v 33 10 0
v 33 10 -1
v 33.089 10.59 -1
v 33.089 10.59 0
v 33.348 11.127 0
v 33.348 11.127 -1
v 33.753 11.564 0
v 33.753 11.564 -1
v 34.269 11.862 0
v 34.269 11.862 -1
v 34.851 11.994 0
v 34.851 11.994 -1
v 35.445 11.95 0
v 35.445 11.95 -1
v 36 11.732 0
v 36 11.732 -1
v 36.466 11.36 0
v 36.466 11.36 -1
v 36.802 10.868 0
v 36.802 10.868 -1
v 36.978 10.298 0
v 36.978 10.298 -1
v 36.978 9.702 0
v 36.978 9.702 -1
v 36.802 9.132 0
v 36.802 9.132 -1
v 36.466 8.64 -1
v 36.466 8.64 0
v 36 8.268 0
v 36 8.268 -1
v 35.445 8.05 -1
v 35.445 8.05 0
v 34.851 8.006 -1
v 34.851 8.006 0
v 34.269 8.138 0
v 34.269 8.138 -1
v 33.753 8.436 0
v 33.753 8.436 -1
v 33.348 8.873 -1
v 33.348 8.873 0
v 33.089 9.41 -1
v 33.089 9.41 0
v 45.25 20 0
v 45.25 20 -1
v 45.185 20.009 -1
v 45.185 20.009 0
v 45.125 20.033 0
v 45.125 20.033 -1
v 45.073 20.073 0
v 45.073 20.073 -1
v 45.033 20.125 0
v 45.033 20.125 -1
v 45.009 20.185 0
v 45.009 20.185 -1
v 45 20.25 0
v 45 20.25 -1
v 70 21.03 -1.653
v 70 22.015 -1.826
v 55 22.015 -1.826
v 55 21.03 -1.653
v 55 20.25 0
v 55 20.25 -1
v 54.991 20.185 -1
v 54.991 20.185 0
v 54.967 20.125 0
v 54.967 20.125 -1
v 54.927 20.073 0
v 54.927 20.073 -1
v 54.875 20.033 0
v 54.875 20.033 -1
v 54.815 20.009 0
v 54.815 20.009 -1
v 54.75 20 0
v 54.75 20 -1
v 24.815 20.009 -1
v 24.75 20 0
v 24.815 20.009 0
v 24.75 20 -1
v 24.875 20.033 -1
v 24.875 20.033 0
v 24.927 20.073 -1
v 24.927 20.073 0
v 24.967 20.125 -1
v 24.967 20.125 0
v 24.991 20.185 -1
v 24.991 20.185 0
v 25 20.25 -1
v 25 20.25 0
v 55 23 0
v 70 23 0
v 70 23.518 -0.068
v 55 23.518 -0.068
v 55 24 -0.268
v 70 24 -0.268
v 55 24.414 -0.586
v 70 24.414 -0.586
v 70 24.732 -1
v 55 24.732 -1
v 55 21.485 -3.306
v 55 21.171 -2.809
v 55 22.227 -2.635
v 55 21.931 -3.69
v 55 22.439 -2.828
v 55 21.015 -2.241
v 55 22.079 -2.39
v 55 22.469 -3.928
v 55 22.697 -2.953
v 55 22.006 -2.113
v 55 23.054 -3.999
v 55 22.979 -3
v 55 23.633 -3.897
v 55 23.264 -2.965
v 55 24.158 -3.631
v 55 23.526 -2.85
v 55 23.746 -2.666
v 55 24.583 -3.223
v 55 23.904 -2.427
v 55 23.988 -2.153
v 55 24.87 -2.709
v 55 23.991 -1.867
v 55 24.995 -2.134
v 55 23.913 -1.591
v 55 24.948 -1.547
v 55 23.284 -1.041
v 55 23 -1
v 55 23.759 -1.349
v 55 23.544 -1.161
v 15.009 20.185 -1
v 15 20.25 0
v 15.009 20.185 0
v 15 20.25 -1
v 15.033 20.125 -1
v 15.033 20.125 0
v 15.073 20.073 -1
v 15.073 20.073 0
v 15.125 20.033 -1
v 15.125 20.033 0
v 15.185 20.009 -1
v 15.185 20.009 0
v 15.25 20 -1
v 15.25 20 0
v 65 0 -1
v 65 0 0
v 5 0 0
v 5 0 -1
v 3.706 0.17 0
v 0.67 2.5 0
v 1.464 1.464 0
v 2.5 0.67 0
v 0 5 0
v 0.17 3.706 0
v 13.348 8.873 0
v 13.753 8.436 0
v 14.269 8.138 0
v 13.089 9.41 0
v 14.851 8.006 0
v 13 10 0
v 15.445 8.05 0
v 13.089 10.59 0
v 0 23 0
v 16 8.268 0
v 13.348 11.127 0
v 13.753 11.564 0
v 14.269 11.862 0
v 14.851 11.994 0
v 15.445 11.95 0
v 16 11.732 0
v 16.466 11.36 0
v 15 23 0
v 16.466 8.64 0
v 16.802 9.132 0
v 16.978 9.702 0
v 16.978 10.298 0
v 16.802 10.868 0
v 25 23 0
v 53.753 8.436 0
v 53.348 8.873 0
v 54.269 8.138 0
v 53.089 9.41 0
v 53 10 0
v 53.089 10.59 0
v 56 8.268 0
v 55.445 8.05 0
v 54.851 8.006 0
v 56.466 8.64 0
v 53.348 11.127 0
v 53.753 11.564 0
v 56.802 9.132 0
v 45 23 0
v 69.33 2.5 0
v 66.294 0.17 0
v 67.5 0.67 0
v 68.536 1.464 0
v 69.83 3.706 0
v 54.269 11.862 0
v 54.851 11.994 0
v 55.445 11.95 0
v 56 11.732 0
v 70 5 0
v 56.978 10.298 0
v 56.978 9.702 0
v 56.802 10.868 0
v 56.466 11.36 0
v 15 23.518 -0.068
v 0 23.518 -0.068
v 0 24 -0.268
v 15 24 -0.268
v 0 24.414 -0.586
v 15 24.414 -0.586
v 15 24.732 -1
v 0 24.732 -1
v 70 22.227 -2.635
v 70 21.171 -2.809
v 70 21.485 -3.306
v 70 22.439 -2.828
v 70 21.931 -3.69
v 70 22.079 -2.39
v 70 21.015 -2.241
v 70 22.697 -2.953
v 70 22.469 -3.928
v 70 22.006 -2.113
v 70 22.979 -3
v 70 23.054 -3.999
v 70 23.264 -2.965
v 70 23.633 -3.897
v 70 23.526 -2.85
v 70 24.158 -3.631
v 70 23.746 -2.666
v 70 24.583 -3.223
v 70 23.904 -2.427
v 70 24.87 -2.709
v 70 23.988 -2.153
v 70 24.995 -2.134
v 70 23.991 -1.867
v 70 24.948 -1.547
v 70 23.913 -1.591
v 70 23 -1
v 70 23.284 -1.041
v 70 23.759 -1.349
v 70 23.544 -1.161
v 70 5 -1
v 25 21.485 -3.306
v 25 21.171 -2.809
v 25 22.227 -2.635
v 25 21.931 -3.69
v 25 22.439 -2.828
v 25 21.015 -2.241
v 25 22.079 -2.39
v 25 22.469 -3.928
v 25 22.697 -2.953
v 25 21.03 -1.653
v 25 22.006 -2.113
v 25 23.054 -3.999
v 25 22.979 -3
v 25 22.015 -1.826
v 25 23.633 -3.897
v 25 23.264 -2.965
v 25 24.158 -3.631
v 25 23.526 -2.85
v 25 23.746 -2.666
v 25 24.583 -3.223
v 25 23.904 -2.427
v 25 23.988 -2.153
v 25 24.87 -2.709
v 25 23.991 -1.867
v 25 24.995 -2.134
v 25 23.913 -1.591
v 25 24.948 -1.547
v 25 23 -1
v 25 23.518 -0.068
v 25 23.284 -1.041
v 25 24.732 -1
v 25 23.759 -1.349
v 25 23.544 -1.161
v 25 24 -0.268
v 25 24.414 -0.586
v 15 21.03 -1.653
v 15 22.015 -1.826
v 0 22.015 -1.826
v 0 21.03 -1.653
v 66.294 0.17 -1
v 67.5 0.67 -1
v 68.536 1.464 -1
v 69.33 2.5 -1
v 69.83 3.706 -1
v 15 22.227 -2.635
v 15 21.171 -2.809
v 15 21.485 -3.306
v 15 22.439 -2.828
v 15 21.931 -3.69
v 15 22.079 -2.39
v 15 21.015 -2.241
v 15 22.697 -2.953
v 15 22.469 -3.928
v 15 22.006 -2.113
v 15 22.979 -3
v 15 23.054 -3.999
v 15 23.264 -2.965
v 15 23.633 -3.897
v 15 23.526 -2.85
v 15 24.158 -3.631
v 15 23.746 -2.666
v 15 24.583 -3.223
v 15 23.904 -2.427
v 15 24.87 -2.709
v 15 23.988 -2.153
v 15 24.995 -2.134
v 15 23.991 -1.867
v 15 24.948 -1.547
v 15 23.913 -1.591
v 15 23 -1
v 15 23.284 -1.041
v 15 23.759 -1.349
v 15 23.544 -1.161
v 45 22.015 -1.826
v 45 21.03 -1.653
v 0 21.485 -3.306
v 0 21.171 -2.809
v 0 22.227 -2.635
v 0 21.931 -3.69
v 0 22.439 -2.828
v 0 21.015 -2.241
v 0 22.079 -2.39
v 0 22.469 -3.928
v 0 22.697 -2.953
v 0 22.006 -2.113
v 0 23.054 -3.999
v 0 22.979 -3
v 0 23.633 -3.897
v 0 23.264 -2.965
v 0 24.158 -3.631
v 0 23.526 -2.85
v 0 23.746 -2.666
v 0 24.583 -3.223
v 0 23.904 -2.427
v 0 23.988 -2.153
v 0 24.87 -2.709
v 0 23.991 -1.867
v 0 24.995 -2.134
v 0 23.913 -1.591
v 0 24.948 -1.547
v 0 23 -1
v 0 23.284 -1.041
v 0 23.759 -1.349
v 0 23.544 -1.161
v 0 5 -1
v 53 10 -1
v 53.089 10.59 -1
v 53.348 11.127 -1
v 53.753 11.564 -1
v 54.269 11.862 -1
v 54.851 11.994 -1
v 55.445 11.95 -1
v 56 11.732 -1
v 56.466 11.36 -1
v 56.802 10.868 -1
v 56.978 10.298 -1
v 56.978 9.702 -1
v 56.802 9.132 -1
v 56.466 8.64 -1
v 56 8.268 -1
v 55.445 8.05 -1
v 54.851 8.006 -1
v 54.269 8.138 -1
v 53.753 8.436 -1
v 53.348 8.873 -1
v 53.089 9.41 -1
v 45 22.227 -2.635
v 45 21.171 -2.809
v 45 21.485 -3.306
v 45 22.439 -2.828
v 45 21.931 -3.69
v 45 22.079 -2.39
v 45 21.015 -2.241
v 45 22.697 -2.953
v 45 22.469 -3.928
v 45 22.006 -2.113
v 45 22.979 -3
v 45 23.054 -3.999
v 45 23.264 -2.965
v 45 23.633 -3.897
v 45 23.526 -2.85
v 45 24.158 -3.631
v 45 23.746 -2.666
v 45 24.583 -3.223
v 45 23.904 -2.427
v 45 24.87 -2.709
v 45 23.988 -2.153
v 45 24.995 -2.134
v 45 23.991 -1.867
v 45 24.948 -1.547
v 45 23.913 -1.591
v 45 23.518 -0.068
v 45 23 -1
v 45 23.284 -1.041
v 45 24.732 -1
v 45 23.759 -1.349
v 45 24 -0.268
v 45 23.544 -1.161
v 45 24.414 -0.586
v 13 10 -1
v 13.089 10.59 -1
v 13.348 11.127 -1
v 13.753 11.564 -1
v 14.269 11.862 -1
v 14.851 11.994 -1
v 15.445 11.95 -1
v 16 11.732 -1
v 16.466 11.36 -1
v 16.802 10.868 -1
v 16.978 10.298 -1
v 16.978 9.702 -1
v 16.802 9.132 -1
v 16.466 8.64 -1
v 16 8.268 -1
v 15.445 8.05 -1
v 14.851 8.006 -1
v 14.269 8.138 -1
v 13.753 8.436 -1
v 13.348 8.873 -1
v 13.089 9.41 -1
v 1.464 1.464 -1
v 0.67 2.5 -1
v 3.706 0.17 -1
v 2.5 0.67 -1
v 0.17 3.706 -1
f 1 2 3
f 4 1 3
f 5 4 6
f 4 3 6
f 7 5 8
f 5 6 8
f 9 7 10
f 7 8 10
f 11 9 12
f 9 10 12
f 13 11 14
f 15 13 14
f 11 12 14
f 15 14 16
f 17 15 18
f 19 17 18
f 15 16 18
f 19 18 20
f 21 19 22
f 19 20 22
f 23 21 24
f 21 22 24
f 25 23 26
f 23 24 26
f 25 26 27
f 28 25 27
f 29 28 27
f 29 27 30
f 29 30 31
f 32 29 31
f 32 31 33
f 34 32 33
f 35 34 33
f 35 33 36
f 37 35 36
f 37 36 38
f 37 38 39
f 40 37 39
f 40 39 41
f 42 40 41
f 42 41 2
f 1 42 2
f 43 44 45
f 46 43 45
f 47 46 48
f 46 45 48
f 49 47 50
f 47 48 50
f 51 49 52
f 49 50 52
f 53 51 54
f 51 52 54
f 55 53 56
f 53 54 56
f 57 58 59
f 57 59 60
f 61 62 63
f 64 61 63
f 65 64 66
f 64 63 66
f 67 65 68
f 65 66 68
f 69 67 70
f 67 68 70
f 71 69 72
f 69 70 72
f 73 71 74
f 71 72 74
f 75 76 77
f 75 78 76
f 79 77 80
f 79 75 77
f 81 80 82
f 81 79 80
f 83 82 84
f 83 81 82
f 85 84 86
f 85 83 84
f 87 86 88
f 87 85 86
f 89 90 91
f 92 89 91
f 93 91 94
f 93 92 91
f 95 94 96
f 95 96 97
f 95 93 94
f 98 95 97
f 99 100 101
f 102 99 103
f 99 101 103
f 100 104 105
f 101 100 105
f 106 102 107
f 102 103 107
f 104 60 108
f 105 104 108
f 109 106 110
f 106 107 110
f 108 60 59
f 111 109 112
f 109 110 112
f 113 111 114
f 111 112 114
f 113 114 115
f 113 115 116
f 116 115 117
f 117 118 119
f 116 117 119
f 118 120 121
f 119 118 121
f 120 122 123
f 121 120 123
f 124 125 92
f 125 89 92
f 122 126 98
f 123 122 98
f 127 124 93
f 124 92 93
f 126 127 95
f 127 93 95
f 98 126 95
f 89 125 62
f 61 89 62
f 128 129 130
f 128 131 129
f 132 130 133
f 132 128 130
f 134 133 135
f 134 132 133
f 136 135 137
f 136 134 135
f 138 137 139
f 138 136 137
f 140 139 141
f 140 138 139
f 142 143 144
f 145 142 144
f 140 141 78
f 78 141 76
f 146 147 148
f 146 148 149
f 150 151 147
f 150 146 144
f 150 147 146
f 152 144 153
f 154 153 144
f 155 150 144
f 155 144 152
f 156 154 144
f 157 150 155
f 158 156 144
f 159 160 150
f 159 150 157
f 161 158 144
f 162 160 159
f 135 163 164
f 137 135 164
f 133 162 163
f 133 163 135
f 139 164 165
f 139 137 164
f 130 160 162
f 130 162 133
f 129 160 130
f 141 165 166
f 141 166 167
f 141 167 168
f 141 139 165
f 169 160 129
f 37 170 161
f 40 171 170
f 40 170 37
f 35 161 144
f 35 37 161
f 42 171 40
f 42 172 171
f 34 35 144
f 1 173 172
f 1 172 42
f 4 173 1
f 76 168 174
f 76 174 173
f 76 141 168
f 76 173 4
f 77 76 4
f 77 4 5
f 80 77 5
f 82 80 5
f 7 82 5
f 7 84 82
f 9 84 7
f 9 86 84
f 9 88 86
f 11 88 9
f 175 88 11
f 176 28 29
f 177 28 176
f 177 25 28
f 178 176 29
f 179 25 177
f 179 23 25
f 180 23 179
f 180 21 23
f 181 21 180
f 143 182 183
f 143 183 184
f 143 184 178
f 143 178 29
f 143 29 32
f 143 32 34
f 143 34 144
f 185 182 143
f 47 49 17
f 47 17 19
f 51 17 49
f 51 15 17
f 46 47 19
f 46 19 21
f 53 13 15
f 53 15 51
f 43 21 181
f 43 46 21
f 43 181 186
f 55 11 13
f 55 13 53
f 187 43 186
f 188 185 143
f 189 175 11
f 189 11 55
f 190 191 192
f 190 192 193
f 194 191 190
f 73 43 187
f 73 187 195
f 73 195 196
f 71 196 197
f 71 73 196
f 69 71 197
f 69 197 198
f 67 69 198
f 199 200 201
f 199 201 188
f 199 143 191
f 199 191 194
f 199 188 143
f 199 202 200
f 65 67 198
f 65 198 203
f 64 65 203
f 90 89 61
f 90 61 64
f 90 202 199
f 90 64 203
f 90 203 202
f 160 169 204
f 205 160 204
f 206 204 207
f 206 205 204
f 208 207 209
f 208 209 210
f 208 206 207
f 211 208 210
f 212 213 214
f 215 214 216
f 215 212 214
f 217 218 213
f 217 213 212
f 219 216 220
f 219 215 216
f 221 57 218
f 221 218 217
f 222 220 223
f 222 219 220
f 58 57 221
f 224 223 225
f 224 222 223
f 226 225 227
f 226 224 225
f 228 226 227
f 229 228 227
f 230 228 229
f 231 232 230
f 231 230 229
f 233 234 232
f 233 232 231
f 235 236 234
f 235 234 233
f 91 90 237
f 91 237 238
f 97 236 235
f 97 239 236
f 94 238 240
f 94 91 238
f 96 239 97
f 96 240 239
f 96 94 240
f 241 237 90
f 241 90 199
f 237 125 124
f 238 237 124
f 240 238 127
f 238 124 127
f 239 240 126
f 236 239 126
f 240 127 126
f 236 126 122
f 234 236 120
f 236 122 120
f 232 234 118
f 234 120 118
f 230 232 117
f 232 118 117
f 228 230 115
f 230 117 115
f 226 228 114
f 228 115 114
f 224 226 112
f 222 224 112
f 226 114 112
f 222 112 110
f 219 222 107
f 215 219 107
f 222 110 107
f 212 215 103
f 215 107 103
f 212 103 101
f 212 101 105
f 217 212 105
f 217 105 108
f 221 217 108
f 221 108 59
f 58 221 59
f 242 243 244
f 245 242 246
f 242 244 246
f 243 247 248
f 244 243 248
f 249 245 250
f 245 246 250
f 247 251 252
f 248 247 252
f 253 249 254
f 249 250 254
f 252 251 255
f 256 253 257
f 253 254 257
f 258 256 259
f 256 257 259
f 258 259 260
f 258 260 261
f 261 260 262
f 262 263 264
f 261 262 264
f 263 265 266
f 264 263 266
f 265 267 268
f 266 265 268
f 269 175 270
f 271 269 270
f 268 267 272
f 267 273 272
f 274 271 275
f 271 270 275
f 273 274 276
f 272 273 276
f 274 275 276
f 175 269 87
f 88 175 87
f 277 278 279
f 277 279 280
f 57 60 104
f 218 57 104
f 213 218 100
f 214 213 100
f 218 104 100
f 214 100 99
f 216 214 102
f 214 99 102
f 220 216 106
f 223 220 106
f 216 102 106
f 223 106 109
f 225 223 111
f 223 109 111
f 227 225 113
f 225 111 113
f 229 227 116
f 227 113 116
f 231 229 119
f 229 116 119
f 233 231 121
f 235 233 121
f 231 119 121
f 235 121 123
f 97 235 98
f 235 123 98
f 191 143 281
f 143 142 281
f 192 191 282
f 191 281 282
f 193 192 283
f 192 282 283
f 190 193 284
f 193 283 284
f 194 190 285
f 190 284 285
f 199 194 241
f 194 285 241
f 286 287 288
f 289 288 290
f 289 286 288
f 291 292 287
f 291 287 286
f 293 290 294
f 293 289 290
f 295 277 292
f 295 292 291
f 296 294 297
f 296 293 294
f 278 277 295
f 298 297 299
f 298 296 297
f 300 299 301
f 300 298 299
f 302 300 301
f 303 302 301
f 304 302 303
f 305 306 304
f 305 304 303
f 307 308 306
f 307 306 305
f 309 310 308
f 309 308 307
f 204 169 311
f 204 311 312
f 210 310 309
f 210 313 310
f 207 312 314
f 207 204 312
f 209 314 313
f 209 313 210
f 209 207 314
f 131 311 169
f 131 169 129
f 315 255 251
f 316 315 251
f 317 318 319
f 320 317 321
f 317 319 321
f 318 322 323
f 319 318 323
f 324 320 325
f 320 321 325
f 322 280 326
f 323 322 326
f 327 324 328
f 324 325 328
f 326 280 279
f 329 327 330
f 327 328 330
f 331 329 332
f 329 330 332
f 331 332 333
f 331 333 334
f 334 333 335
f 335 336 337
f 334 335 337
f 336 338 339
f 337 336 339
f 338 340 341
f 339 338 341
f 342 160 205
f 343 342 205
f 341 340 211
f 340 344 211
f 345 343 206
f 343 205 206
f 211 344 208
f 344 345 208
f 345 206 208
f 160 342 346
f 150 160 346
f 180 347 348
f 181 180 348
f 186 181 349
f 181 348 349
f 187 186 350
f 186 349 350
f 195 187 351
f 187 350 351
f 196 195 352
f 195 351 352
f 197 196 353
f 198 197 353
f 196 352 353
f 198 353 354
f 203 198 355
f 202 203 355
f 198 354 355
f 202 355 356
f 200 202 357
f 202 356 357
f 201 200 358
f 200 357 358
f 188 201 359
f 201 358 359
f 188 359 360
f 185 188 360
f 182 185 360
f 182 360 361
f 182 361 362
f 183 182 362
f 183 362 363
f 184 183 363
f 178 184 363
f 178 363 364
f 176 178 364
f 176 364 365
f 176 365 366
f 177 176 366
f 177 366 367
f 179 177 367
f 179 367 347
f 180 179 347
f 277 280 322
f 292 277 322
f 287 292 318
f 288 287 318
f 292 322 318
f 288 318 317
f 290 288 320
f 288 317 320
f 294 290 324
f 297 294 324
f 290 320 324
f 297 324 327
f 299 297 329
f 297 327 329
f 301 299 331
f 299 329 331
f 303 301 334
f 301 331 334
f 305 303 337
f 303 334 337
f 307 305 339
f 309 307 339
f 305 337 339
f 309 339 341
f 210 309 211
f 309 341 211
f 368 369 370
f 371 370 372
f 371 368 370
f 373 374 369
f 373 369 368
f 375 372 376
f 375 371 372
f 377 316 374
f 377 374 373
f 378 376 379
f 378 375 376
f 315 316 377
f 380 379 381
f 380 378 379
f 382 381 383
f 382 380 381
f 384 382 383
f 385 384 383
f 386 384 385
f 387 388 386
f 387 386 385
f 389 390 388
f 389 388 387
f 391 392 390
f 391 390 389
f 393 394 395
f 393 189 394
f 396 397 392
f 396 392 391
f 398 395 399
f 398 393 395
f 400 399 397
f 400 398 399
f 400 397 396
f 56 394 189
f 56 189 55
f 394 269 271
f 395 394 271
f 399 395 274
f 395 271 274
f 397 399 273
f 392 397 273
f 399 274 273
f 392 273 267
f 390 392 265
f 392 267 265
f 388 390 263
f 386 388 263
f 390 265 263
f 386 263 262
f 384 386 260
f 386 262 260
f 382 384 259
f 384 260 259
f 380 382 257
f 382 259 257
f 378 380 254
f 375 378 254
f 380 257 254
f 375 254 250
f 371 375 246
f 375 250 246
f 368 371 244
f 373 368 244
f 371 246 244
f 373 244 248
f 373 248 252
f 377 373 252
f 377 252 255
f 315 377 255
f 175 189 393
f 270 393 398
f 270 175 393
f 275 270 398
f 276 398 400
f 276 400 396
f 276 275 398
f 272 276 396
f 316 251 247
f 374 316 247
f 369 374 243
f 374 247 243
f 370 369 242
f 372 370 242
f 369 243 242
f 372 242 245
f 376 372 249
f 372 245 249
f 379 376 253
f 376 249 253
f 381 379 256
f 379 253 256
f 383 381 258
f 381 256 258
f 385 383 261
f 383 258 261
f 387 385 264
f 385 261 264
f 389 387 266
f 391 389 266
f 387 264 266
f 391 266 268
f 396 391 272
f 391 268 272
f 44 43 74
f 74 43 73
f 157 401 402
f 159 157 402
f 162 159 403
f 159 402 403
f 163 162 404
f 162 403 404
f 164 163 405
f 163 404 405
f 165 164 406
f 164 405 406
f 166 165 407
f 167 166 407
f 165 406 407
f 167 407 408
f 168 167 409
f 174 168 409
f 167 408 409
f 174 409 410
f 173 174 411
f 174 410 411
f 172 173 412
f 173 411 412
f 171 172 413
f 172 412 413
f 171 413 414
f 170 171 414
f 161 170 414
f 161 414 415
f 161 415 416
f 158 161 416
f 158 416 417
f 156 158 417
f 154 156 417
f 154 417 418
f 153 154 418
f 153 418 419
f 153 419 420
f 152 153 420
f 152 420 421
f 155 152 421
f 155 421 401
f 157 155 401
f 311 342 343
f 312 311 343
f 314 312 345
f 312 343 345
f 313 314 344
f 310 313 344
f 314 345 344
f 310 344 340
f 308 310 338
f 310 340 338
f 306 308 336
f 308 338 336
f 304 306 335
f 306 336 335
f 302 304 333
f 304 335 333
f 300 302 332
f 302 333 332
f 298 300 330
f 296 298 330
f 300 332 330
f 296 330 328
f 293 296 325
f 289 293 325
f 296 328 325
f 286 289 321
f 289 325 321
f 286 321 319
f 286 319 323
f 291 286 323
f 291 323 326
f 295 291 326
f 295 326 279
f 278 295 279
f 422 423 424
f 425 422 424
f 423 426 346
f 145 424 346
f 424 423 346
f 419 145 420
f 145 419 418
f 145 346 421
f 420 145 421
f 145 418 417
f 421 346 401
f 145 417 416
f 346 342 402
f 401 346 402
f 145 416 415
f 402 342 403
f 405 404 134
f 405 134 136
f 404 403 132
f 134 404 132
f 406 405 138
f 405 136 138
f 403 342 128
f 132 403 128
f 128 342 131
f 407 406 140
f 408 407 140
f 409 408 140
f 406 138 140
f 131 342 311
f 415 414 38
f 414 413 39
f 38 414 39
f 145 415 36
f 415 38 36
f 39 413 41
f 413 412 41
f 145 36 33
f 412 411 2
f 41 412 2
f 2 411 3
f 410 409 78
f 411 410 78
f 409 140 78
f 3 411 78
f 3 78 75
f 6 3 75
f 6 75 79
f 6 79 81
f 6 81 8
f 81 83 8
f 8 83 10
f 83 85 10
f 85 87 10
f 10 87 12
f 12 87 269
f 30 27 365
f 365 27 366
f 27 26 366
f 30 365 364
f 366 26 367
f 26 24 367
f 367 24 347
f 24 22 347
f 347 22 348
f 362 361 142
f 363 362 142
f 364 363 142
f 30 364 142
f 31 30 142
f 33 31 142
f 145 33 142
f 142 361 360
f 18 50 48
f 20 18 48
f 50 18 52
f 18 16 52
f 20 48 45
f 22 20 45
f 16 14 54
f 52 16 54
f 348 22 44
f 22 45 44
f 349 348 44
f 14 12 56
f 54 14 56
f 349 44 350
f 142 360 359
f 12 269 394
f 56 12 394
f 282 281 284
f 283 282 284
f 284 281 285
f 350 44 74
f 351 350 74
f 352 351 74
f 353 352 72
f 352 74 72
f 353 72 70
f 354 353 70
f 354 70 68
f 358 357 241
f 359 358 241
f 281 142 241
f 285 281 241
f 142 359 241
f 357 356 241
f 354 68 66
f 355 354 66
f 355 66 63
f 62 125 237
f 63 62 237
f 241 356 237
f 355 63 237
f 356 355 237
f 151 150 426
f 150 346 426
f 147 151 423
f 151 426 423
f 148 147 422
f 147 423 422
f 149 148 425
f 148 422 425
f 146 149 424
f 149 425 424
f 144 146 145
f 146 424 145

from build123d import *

# Parameters (mm, degrees)
SM_BASE_FLANGE_1_DEPTH = 1
OTHER_1_DEPTH          = 70
OTHER_START            = 25
OTHER_1_2_DEPTH        = 20
OTHER_1_3_DEPTH        = 15
OTHER_START_2          = 55
OTHER_1_4_DEPTH        = 15
SKETCH_12_R            = 2
CUT_EXTRUDE_1_DEPTH    = 10
OTHER_START_3          = -1
OTHER_1_5_DEPTH        = 1
FILLET_1_R             = 0.25
FILLET_2_R             = 5


# Read off the part's stored shape, not the designer's step: 햄1, 코너 자르기1
# Sheet-metal steps are written as plain solids
with BuildPart() as part:
    # Sketch 1 → 베이스-플랜지1 (new body)
    with BuildSketch(Plane.XY):
        Polygon((0, 0), (0, 25), (15, 25), (15, 20), (25, 20), (25, 25), (45, 25), (45, 20), (55, 20), (55, 25), (70, 25), (70, 0), align=None)
    extrude(amount=-SM_BASE_FLANGE_1_DEPTH)

    # Other 1 outline → Other 1 (cut)
    with BuildSketch(Plane.YZ):
        with BuildLine():
            ThreePointArc((23, 0), (24, -0.267949192), (24.732050807, -1))
            Line((24.732050807, -1), (25, -1))
            Line((25, -1), (25, 0))
            Line((25, 0), (23, 0))
        make_face()
    extrude(amount=OTHER_1_DEPTH, mode=Mode.SUBTRACT)

    # Other 1 2 outline → Other 1 2 (add)
    with BuildSketch(Plane.YZ.offset(OTHER_START)):
        with BuildLine():
            Line((22.015192247, -1.826351822), (21.030384494, -1.652703645))
            ThreePointArc((21.030384494, -1.652703645), (23.347296355, -3.969615506), (24.732050807, -1))
            Line((24.732050807, -1), (23, -1))
            ThreePointArc((23, -1), (23.64278761, -2.766044443), (22.015192247, -1.826351822))
        make_face()
    extrude(amount=OTHER_1_2_DEPTH)

    # Other 1 3 outline → Other 1 3 (add)
    with BuildSketch(Plane.YZ):
        with BuildLine():
            Line((22.015192247, -1.826351822), (21.030384494, -1.652703645))
            ThreePointArc((21.030384494, -1.652703645), (23.347296355, -3.969615506), (24.732050807, -1))
            Line((24.732050807, -1), (23, -1))
            ThreePointArc((23, -1), (23.64278761, -2.766044443), (22.015192247, -1.826351822))
        make_face()
    extrude(amount=OTHER_1_3_DEPTH)

    # Other 1 4 outline → Other 1 4 (add)
    with BuildSketch(Plane.YZ.offset(OTHER_START_2)):
        with BuildLine():
            Line((22.015192247, -1.826351822), (21.030384494, -1.652703645))
            ThreePointArc((21.030384494, -1.652703645), (23.347296355, -3.969615506), (24.732050807, -1))
            Line((24.732050807, -1), (23, -1))
            ThreePointArc((23, -1), (23.64278761, -2.766044443), (22.015192247, -1.826351822))
        make_face()
    extrude(amount=OTHER_1_4_DEPTH)

    # 스케치12 → 컷-돌출1 (cut)
    with BuildSketch(Plane(origin=(0, 0, -1), x_dir=(-1, 0, 0), z_dir=(0, 0, -1))):
        with Locations((-35, 10)):
            Circle(SKETCH_12_R)
        with Locations((-55, 10)):
            Circle(SKETCH_12_R)
        with Locations((-15, 10)):
            Circle(SKETCH_12_R)
    extrude(amount=-CUT_EXTRUDE_1_DEPTH, mode=Mode.SUBTRACT)

    # Other 1 5 outline → Other 1 5 (add)
    with BuildSketch(Plane.XY.offset(OTHER_START_3)):
        with BuildLine():
            Line((45, 20), (45.25, 20))
            ThreePointArc((45.25, 20), (45.073223305, 20.073223305), (45, 20.25))
            Line((45, 20.25), (45, 20))
        make_face()
        with BuildLine():
            ThreePointArc((55, 20.25), (54.926776695, 20.073223305), (54.75, 20))
            Line((54.75, 20), (55, 20))
            Line((55, 20), (55, 20.25))
        make_face()
    extrude(amount=OTHER_1_5_DEPTH)

    # 필렛1
    fillet_1_edges = [part.edges().sort_by_distance(p)[0] for p in [
        (15, 20, -0.5),
        (25, 20, -0.5),
    ]]
    fillet(fillet_1_edges, radius=FILLET_1_R)

    # 필렛2
    fillet_2_edges = [part.edges().sort_by_distance(p)[0] for p in [
        (0, 0, -0.5),
        (70, 0, -0.5),
    ]]
    fillet(fillet_2_edges, radius=FILLET_2_R)


solid = part.part
